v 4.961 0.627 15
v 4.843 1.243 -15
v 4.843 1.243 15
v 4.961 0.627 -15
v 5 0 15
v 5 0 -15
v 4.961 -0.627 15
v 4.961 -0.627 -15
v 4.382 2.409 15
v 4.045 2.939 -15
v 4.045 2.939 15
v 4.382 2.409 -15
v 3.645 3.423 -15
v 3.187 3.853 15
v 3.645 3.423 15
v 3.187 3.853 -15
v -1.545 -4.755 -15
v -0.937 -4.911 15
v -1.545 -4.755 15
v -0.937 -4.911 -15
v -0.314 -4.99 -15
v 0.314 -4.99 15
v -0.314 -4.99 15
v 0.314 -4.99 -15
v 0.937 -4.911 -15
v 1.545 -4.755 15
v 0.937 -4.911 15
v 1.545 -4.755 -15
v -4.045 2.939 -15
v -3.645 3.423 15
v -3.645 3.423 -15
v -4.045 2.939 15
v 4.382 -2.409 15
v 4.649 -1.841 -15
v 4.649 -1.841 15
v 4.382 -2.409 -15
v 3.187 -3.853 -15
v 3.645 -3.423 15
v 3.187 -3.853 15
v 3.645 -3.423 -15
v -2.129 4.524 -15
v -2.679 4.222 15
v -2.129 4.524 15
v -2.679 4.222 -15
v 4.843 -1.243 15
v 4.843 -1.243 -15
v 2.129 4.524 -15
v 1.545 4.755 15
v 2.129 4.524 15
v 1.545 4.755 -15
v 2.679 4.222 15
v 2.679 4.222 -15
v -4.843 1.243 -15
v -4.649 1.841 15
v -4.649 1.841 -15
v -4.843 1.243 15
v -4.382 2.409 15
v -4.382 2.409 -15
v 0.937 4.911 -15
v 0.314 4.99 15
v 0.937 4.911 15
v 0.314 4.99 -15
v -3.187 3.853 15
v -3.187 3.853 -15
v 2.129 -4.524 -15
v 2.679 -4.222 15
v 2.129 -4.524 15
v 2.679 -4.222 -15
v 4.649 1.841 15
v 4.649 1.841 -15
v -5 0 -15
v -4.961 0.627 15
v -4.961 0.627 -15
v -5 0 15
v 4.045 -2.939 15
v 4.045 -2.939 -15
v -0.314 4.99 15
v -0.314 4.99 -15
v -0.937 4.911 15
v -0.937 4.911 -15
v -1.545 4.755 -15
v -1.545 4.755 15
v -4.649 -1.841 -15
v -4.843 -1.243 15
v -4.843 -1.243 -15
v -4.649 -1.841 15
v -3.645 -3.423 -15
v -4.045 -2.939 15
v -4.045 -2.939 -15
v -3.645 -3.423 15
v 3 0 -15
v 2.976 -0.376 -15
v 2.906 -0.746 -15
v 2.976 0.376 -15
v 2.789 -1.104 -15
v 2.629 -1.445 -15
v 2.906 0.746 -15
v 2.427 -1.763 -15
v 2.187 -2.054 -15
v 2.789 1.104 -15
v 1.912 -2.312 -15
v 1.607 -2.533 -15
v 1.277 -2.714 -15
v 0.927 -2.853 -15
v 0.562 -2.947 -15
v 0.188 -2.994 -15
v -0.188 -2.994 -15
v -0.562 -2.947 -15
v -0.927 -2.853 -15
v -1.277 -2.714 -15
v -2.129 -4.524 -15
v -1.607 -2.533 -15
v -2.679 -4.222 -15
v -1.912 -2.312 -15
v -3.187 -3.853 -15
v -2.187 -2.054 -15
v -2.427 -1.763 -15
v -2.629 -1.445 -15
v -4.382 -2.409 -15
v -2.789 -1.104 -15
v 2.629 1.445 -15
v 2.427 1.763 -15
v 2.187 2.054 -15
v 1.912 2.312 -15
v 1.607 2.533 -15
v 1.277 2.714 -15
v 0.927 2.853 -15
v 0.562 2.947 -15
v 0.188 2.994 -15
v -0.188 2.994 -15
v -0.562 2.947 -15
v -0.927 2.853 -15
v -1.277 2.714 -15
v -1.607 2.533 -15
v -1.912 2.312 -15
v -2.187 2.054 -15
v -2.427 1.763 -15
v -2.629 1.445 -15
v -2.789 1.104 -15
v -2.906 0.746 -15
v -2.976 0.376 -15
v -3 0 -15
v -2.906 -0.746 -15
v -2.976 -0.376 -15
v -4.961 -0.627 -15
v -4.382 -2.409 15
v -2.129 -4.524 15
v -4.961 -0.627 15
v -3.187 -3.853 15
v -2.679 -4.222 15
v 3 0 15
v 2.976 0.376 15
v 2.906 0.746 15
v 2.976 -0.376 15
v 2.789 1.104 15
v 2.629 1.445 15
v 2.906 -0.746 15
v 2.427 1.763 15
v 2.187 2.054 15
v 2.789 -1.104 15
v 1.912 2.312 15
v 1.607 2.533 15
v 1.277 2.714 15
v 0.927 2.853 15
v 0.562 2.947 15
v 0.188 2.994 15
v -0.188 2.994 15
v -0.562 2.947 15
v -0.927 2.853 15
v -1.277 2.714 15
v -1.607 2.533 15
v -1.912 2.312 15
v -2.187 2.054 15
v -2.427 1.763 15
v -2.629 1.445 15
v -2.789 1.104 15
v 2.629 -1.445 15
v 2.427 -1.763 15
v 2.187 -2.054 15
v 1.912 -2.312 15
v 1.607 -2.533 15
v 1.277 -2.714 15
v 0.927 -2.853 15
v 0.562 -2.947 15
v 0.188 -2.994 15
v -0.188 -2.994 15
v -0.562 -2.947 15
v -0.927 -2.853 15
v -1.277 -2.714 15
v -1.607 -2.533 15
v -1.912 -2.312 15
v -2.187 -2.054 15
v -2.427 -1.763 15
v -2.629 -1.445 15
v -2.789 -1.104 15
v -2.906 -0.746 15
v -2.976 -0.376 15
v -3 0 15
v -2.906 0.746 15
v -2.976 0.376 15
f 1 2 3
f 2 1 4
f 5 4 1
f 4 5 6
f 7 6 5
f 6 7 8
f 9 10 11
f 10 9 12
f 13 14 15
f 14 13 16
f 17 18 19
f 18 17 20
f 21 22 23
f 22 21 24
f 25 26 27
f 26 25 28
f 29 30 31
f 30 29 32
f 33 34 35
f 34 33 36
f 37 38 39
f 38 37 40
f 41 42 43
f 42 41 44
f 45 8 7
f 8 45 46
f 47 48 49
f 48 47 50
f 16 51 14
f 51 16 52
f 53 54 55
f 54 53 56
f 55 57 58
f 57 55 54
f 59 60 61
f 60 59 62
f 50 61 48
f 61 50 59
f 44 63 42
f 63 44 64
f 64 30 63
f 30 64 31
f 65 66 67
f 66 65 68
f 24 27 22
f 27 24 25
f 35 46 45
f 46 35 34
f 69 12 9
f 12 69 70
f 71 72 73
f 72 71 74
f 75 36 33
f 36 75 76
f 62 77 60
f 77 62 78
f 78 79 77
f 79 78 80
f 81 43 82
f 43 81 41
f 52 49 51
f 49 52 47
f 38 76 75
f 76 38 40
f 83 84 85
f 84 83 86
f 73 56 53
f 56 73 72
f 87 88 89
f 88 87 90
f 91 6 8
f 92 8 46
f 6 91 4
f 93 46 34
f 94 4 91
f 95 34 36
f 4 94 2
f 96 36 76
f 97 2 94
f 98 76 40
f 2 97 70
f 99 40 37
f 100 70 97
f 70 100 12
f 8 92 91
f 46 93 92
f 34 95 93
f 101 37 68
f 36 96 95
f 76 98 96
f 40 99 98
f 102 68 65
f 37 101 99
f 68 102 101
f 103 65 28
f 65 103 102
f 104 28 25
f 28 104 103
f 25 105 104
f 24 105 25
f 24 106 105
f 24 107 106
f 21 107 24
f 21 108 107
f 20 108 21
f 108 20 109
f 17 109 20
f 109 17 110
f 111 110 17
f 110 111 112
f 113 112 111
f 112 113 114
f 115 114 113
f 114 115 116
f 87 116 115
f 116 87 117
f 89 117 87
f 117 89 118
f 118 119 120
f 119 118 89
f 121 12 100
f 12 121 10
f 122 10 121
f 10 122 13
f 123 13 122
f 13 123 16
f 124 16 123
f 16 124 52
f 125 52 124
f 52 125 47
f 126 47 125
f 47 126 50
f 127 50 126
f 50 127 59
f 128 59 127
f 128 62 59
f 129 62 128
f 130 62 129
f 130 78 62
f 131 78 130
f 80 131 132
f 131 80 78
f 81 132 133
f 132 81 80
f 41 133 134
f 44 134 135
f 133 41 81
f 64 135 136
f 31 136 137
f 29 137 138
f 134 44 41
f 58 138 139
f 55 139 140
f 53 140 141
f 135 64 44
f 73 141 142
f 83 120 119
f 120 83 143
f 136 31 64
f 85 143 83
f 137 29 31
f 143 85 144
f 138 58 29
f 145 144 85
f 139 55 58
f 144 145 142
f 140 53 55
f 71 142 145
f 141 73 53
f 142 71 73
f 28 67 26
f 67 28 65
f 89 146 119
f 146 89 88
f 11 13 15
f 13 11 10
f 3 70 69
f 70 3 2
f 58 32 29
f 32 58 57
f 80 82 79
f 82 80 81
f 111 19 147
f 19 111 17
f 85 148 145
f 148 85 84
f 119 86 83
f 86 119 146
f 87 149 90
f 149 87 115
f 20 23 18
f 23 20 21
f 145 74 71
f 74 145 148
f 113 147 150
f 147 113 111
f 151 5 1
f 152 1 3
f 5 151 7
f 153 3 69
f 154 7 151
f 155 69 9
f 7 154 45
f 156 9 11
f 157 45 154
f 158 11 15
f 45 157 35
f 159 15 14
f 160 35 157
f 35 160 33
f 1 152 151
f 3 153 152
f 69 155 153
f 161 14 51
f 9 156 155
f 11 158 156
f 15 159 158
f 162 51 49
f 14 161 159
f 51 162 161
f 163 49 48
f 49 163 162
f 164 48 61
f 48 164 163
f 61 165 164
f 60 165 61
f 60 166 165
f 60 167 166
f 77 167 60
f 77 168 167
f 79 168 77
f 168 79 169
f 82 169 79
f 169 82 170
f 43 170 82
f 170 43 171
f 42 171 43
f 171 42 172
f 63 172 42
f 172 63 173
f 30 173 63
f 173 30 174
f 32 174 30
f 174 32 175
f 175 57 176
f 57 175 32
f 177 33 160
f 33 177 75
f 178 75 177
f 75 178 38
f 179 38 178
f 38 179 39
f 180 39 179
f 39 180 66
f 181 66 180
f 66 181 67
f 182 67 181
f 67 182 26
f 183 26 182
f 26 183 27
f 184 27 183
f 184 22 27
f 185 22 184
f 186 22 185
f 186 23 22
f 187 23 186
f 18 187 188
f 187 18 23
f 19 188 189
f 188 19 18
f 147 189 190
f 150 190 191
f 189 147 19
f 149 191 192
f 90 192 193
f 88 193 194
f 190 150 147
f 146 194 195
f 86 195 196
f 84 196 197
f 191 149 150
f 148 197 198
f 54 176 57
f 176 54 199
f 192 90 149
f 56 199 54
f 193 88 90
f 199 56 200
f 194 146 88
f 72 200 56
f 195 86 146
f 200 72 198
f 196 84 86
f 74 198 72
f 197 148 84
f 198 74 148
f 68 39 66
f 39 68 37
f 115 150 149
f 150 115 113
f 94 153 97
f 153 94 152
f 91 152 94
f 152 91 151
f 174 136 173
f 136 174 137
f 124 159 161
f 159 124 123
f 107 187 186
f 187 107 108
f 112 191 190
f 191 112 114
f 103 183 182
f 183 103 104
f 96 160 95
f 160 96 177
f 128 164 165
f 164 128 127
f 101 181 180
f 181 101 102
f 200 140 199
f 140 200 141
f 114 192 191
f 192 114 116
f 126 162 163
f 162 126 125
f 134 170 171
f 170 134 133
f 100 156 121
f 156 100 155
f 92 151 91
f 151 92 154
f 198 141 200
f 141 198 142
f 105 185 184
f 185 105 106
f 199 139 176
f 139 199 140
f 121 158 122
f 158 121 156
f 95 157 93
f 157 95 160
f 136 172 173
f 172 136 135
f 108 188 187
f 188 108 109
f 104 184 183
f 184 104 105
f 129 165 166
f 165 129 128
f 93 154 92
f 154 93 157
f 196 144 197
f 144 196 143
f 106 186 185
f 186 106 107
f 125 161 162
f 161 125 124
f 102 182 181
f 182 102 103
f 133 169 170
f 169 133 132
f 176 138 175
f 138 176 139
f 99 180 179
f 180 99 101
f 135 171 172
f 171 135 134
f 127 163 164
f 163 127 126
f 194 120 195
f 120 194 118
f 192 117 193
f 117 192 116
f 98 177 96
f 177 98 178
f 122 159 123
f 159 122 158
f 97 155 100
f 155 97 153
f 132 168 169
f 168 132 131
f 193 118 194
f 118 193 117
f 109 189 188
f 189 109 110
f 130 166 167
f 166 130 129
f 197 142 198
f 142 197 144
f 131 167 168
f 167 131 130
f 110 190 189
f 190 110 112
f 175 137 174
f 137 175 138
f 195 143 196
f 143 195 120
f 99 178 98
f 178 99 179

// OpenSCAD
$fn = 50;


difference() {
	union() {
		translate(v = [0, 0, -15.0000000000]) {
			cylinder(h = 30, r = 5.0000000000);
		}
	}
	union() {
		translate(v = [0, 0, -100.0000000000]) {
			cylinder(h = 200, r = 3.0000000000);
		}
	}
}
